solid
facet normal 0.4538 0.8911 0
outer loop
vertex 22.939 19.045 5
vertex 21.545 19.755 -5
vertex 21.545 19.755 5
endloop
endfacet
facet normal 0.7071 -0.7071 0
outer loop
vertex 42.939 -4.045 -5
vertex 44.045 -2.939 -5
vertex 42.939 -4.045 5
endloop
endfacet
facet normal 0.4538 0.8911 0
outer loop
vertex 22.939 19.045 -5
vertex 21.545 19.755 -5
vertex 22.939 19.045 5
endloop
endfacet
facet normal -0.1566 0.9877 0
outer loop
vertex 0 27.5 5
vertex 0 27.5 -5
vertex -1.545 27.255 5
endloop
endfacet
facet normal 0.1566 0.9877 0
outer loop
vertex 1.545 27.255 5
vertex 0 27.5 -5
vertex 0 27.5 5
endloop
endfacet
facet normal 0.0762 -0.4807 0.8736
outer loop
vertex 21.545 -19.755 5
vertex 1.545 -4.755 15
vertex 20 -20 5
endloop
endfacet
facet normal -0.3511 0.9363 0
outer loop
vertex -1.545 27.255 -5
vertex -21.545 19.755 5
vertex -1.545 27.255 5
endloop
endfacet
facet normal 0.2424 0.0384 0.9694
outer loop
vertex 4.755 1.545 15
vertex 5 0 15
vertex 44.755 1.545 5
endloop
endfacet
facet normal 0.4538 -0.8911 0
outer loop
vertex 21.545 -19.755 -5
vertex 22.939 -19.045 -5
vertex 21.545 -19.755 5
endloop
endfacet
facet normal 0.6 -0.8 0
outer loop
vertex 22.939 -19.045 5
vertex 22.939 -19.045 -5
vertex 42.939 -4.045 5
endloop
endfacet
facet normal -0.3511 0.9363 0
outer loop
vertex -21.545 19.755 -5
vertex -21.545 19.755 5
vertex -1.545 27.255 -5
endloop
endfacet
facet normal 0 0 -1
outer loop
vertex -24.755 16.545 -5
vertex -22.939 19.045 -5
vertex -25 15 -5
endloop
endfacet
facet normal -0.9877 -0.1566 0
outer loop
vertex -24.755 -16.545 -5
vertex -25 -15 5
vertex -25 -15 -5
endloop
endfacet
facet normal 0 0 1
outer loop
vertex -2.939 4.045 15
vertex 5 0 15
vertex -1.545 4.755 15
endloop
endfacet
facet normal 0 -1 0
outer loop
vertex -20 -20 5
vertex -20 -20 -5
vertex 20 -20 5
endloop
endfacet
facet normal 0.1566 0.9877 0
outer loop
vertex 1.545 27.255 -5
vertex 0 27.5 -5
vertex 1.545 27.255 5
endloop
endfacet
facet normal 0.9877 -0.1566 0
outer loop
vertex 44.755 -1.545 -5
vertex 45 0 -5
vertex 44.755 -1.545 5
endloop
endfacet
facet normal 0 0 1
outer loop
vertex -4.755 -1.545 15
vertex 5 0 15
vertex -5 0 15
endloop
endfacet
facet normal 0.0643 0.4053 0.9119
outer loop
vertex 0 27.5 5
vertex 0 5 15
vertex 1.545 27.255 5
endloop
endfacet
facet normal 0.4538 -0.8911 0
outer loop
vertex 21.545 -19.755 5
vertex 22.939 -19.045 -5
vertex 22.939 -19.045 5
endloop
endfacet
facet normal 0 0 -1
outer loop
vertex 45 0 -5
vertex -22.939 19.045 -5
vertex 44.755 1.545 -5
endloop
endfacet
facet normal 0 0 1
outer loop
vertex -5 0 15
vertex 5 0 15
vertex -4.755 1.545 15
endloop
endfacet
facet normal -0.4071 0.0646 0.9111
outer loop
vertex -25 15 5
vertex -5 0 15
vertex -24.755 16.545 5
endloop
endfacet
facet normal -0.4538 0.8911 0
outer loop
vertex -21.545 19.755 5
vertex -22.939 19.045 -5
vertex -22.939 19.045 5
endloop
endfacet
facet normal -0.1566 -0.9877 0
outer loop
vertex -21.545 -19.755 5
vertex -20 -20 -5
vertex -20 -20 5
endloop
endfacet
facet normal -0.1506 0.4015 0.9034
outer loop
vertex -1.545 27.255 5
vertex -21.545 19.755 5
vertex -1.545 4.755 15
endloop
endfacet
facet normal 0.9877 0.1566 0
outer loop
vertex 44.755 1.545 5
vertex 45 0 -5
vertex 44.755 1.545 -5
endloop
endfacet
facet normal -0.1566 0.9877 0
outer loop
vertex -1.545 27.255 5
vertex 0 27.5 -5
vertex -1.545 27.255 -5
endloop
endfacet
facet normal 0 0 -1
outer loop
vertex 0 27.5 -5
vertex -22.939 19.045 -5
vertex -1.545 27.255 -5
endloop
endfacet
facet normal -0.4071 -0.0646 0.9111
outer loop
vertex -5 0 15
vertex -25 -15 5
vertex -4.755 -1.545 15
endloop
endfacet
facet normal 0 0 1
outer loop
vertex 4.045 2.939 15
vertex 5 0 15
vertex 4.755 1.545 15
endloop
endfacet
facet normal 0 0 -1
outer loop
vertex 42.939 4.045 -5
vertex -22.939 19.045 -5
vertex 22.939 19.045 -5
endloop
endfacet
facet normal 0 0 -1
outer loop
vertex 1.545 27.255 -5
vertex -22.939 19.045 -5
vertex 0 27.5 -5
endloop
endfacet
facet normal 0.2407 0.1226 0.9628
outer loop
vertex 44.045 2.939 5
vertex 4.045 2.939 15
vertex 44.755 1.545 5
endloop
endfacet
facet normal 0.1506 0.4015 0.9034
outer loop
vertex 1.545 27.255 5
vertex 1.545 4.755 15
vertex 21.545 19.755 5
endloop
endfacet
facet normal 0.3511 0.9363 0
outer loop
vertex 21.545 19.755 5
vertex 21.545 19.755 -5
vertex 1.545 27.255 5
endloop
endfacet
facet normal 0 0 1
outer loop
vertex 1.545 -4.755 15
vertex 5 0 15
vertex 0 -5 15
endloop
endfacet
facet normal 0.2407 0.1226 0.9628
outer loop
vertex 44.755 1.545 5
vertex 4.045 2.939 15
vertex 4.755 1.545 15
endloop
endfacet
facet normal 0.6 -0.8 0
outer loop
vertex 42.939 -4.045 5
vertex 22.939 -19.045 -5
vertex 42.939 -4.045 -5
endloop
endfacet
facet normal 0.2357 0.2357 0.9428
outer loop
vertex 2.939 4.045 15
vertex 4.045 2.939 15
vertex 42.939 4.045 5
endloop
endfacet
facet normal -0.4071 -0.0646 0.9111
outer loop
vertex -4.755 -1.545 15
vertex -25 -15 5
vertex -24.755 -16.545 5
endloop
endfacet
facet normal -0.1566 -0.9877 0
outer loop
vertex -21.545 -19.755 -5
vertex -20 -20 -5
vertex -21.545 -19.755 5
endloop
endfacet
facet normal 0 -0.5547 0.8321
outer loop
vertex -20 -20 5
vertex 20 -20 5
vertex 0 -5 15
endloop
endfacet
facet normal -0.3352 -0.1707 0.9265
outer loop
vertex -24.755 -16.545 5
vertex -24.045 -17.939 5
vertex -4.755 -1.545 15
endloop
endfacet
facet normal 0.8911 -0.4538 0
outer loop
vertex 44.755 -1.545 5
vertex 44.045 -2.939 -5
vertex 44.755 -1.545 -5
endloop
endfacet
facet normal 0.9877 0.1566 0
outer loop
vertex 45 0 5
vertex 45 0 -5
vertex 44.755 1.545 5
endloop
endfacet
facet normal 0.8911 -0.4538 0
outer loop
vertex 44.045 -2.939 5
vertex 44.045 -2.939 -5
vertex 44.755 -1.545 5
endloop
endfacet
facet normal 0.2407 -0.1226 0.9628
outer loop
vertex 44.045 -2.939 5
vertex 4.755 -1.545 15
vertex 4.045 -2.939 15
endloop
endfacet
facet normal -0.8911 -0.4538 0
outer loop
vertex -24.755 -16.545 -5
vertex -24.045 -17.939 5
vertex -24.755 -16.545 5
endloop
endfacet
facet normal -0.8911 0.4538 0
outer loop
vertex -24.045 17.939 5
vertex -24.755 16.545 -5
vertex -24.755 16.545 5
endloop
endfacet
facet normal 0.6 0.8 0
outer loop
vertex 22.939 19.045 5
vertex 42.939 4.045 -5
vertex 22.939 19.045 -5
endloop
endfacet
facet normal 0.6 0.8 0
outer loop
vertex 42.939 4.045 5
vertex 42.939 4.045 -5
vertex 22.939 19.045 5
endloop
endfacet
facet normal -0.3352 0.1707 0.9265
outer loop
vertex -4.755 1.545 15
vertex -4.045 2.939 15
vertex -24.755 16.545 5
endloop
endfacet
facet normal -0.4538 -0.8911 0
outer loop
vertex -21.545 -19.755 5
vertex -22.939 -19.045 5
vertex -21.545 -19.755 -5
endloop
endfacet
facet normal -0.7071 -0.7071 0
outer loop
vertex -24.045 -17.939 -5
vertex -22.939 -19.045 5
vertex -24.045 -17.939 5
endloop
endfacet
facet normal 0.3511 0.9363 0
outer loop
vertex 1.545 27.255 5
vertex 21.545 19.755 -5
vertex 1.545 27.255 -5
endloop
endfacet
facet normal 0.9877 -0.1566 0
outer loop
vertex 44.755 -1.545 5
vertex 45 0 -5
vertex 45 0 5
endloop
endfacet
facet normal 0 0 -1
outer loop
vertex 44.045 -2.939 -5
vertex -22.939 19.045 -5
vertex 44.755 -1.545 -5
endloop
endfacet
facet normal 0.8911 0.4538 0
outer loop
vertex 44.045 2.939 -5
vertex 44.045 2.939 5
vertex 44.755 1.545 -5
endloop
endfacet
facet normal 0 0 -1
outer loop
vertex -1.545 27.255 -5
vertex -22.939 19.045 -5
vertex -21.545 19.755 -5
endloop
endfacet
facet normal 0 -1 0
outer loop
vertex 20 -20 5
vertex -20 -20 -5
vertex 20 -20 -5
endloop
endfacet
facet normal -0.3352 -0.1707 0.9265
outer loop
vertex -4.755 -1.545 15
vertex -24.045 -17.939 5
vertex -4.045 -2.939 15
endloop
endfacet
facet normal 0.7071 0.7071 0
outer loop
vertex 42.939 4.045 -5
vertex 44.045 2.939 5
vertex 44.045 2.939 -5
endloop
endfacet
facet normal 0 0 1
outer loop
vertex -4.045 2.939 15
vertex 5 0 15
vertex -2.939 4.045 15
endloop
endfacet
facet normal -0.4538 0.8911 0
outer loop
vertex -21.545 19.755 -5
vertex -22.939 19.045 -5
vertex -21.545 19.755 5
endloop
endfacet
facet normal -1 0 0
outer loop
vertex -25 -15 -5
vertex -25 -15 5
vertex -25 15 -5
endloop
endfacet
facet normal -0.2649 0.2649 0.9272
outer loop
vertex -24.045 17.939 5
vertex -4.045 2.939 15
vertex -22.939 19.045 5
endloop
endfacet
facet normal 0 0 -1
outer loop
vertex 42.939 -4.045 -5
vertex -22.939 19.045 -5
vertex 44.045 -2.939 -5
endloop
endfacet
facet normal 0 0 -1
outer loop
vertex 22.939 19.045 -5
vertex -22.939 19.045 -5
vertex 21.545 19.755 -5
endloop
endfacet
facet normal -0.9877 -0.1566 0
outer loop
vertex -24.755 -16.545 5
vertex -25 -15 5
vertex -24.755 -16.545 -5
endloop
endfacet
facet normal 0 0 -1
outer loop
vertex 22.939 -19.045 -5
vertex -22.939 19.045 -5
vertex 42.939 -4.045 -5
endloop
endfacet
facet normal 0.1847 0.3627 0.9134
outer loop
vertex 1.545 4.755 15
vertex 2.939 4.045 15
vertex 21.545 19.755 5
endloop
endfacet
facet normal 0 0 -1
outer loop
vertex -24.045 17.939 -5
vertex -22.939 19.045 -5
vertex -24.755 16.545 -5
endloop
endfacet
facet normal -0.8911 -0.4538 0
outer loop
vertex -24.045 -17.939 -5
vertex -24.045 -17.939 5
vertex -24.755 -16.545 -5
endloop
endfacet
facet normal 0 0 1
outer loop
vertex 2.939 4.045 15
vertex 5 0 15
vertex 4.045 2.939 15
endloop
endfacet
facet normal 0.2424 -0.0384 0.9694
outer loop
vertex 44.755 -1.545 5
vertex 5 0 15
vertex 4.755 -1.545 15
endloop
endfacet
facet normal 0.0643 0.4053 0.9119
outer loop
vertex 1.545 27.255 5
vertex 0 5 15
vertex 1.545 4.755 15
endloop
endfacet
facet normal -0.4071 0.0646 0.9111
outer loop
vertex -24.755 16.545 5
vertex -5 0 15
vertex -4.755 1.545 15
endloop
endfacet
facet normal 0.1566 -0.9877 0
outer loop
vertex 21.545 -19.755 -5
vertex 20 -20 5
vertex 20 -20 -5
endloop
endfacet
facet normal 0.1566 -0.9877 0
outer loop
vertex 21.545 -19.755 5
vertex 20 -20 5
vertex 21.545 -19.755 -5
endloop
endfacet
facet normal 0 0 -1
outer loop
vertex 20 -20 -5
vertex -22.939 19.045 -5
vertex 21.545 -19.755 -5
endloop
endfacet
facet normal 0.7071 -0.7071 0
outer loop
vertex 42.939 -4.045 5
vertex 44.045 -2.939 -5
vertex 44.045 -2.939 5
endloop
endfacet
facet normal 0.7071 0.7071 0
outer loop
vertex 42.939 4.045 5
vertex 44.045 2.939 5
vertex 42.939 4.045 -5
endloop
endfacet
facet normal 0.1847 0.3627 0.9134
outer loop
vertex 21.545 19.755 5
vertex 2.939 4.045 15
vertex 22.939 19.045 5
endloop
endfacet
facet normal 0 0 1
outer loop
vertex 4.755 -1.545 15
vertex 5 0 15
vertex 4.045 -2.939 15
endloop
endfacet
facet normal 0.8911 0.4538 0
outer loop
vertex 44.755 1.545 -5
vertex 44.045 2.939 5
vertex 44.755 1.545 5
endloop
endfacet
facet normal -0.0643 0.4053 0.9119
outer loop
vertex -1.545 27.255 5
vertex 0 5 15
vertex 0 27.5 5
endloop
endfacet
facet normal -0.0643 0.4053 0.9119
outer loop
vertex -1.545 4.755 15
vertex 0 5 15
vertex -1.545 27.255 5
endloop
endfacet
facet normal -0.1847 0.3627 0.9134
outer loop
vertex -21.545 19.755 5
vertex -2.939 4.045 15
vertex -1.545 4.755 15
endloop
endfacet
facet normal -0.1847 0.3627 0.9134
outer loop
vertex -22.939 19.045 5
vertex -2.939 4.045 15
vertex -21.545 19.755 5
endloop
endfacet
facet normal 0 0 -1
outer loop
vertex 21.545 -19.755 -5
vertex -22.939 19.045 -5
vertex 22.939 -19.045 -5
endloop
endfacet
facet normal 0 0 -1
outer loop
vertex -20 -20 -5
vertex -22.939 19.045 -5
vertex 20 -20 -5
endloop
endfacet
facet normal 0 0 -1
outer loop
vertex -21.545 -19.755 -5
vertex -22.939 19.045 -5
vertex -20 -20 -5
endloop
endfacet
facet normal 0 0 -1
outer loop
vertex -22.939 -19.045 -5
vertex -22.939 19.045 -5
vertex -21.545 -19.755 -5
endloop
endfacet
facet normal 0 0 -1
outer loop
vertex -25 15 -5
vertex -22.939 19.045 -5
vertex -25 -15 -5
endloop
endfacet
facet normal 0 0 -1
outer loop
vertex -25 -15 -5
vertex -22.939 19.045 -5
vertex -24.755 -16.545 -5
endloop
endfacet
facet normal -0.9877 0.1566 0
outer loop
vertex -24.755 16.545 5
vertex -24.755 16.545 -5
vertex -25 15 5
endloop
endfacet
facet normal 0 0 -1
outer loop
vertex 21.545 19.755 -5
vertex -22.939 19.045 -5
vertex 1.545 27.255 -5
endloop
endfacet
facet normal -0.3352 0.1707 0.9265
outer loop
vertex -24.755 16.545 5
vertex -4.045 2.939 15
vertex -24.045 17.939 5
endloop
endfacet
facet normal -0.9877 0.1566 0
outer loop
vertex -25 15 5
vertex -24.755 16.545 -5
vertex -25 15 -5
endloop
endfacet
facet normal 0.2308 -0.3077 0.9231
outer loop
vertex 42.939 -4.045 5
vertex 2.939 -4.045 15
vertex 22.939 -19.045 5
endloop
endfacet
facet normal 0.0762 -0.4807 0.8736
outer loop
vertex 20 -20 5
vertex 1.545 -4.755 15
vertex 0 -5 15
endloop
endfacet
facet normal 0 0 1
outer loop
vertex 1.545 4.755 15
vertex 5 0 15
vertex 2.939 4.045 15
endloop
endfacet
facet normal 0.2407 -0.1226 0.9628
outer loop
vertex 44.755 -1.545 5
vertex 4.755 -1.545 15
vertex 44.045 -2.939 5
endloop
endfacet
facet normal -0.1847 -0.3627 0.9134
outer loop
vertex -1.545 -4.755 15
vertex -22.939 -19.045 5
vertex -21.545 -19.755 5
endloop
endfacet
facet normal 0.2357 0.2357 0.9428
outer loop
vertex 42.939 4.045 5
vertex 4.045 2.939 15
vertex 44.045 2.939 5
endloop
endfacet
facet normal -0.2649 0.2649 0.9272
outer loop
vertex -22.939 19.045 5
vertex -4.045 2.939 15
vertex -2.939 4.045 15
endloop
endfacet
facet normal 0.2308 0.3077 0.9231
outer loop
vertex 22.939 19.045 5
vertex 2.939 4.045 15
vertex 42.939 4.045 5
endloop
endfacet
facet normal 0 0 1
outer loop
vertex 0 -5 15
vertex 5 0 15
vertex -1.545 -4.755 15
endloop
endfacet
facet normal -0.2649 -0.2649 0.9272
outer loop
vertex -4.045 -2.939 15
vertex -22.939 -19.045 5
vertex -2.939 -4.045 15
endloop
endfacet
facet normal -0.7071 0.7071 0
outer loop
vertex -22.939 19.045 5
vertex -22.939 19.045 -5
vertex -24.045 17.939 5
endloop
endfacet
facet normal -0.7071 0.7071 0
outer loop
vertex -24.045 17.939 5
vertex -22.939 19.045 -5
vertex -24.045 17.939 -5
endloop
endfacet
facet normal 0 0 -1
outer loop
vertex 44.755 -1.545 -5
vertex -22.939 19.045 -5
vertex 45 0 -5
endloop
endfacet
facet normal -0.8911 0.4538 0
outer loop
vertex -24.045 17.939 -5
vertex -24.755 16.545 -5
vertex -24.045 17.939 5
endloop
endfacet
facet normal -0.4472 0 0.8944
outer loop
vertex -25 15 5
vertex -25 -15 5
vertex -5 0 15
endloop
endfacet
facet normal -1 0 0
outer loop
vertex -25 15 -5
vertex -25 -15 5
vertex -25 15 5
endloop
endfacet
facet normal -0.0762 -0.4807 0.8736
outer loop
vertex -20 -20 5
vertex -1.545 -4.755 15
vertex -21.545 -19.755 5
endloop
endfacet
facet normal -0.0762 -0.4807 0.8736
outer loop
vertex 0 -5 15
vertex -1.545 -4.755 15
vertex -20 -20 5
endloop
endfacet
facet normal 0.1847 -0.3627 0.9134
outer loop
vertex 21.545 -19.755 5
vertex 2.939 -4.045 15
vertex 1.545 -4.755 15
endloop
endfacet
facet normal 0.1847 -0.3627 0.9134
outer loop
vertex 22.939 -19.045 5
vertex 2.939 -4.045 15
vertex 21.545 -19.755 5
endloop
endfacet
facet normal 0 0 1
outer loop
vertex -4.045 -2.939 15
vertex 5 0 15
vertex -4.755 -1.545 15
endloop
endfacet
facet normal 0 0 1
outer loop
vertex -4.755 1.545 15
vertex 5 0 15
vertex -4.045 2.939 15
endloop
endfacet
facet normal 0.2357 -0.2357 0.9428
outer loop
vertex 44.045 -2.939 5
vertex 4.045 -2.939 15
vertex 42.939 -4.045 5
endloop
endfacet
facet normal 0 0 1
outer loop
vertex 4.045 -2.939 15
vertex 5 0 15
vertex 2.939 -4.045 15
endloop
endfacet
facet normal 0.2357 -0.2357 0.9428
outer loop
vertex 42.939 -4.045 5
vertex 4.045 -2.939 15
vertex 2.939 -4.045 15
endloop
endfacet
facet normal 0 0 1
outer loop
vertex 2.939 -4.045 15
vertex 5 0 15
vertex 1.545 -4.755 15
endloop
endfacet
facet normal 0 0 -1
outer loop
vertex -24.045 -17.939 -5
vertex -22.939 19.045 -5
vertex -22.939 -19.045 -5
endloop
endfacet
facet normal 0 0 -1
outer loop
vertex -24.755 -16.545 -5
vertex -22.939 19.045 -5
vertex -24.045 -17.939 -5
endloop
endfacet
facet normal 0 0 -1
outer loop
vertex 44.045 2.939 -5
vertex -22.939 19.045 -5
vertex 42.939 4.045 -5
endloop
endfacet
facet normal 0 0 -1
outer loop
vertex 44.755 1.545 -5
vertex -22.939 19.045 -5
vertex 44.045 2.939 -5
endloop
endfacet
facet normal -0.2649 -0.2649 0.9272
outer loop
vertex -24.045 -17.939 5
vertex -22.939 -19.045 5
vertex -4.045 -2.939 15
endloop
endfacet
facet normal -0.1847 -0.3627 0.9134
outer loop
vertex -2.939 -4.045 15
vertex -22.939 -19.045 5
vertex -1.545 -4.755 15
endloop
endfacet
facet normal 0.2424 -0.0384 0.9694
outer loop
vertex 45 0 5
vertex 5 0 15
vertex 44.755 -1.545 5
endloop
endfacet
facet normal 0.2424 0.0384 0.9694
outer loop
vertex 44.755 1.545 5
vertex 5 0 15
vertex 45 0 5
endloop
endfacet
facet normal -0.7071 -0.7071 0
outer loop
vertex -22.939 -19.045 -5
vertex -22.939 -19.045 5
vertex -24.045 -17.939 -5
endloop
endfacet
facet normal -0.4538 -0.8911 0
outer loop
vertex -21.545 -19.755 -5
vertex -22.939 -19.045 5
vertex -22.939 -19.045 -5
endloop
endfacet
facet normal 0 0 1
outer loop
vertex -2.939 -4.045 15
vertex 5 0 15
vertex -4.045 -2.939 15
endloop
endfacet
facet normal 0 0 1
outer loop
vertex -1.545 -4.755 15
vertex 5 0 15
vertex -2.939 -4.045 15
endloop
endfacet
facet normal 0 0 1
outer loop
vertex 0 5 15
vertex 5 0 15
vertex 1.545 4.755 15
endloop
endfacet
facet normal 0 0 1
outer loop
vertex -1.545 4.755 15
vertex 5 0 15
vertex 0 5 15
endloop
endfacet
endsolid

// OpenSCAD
//-- Parametros
r = 5;    //-- Radio del redondeo de las esquinas
h = 10;   //-- Altura

//-- Coordenadas del cilindro del primer cuadrante
cx = 20;
cy = 15;

//-- Vector de puntos, con las posiciones de los cilindros
POINT = [
  [cx, cy, 0],    //-- Punto 0
  [-cx, cy, 0],   //-- Punto 1
  [-cx, -cy, 0],  //-- Punto 2
  [cx, -cy, 0],   //-- Punto 3
  [2*cx, 0, 0],   //-- Punto 4
  [0, 1.5*cy, 0], //-- Punto 5
  [0,0,h],        //-- Punto 6
];  


//-- Obtener el menor objeto convexo que contiene
//--   los cilindros situados en los puntos indicados en 
//-- el vector POINT

hull() {

  //-- Dibujar cada cilindro en su posicion correspondiente
  for (pos = POINT) 
    translate(pos)
      cylinder(r = r, h = h, center = true, $fn = 20);
}
